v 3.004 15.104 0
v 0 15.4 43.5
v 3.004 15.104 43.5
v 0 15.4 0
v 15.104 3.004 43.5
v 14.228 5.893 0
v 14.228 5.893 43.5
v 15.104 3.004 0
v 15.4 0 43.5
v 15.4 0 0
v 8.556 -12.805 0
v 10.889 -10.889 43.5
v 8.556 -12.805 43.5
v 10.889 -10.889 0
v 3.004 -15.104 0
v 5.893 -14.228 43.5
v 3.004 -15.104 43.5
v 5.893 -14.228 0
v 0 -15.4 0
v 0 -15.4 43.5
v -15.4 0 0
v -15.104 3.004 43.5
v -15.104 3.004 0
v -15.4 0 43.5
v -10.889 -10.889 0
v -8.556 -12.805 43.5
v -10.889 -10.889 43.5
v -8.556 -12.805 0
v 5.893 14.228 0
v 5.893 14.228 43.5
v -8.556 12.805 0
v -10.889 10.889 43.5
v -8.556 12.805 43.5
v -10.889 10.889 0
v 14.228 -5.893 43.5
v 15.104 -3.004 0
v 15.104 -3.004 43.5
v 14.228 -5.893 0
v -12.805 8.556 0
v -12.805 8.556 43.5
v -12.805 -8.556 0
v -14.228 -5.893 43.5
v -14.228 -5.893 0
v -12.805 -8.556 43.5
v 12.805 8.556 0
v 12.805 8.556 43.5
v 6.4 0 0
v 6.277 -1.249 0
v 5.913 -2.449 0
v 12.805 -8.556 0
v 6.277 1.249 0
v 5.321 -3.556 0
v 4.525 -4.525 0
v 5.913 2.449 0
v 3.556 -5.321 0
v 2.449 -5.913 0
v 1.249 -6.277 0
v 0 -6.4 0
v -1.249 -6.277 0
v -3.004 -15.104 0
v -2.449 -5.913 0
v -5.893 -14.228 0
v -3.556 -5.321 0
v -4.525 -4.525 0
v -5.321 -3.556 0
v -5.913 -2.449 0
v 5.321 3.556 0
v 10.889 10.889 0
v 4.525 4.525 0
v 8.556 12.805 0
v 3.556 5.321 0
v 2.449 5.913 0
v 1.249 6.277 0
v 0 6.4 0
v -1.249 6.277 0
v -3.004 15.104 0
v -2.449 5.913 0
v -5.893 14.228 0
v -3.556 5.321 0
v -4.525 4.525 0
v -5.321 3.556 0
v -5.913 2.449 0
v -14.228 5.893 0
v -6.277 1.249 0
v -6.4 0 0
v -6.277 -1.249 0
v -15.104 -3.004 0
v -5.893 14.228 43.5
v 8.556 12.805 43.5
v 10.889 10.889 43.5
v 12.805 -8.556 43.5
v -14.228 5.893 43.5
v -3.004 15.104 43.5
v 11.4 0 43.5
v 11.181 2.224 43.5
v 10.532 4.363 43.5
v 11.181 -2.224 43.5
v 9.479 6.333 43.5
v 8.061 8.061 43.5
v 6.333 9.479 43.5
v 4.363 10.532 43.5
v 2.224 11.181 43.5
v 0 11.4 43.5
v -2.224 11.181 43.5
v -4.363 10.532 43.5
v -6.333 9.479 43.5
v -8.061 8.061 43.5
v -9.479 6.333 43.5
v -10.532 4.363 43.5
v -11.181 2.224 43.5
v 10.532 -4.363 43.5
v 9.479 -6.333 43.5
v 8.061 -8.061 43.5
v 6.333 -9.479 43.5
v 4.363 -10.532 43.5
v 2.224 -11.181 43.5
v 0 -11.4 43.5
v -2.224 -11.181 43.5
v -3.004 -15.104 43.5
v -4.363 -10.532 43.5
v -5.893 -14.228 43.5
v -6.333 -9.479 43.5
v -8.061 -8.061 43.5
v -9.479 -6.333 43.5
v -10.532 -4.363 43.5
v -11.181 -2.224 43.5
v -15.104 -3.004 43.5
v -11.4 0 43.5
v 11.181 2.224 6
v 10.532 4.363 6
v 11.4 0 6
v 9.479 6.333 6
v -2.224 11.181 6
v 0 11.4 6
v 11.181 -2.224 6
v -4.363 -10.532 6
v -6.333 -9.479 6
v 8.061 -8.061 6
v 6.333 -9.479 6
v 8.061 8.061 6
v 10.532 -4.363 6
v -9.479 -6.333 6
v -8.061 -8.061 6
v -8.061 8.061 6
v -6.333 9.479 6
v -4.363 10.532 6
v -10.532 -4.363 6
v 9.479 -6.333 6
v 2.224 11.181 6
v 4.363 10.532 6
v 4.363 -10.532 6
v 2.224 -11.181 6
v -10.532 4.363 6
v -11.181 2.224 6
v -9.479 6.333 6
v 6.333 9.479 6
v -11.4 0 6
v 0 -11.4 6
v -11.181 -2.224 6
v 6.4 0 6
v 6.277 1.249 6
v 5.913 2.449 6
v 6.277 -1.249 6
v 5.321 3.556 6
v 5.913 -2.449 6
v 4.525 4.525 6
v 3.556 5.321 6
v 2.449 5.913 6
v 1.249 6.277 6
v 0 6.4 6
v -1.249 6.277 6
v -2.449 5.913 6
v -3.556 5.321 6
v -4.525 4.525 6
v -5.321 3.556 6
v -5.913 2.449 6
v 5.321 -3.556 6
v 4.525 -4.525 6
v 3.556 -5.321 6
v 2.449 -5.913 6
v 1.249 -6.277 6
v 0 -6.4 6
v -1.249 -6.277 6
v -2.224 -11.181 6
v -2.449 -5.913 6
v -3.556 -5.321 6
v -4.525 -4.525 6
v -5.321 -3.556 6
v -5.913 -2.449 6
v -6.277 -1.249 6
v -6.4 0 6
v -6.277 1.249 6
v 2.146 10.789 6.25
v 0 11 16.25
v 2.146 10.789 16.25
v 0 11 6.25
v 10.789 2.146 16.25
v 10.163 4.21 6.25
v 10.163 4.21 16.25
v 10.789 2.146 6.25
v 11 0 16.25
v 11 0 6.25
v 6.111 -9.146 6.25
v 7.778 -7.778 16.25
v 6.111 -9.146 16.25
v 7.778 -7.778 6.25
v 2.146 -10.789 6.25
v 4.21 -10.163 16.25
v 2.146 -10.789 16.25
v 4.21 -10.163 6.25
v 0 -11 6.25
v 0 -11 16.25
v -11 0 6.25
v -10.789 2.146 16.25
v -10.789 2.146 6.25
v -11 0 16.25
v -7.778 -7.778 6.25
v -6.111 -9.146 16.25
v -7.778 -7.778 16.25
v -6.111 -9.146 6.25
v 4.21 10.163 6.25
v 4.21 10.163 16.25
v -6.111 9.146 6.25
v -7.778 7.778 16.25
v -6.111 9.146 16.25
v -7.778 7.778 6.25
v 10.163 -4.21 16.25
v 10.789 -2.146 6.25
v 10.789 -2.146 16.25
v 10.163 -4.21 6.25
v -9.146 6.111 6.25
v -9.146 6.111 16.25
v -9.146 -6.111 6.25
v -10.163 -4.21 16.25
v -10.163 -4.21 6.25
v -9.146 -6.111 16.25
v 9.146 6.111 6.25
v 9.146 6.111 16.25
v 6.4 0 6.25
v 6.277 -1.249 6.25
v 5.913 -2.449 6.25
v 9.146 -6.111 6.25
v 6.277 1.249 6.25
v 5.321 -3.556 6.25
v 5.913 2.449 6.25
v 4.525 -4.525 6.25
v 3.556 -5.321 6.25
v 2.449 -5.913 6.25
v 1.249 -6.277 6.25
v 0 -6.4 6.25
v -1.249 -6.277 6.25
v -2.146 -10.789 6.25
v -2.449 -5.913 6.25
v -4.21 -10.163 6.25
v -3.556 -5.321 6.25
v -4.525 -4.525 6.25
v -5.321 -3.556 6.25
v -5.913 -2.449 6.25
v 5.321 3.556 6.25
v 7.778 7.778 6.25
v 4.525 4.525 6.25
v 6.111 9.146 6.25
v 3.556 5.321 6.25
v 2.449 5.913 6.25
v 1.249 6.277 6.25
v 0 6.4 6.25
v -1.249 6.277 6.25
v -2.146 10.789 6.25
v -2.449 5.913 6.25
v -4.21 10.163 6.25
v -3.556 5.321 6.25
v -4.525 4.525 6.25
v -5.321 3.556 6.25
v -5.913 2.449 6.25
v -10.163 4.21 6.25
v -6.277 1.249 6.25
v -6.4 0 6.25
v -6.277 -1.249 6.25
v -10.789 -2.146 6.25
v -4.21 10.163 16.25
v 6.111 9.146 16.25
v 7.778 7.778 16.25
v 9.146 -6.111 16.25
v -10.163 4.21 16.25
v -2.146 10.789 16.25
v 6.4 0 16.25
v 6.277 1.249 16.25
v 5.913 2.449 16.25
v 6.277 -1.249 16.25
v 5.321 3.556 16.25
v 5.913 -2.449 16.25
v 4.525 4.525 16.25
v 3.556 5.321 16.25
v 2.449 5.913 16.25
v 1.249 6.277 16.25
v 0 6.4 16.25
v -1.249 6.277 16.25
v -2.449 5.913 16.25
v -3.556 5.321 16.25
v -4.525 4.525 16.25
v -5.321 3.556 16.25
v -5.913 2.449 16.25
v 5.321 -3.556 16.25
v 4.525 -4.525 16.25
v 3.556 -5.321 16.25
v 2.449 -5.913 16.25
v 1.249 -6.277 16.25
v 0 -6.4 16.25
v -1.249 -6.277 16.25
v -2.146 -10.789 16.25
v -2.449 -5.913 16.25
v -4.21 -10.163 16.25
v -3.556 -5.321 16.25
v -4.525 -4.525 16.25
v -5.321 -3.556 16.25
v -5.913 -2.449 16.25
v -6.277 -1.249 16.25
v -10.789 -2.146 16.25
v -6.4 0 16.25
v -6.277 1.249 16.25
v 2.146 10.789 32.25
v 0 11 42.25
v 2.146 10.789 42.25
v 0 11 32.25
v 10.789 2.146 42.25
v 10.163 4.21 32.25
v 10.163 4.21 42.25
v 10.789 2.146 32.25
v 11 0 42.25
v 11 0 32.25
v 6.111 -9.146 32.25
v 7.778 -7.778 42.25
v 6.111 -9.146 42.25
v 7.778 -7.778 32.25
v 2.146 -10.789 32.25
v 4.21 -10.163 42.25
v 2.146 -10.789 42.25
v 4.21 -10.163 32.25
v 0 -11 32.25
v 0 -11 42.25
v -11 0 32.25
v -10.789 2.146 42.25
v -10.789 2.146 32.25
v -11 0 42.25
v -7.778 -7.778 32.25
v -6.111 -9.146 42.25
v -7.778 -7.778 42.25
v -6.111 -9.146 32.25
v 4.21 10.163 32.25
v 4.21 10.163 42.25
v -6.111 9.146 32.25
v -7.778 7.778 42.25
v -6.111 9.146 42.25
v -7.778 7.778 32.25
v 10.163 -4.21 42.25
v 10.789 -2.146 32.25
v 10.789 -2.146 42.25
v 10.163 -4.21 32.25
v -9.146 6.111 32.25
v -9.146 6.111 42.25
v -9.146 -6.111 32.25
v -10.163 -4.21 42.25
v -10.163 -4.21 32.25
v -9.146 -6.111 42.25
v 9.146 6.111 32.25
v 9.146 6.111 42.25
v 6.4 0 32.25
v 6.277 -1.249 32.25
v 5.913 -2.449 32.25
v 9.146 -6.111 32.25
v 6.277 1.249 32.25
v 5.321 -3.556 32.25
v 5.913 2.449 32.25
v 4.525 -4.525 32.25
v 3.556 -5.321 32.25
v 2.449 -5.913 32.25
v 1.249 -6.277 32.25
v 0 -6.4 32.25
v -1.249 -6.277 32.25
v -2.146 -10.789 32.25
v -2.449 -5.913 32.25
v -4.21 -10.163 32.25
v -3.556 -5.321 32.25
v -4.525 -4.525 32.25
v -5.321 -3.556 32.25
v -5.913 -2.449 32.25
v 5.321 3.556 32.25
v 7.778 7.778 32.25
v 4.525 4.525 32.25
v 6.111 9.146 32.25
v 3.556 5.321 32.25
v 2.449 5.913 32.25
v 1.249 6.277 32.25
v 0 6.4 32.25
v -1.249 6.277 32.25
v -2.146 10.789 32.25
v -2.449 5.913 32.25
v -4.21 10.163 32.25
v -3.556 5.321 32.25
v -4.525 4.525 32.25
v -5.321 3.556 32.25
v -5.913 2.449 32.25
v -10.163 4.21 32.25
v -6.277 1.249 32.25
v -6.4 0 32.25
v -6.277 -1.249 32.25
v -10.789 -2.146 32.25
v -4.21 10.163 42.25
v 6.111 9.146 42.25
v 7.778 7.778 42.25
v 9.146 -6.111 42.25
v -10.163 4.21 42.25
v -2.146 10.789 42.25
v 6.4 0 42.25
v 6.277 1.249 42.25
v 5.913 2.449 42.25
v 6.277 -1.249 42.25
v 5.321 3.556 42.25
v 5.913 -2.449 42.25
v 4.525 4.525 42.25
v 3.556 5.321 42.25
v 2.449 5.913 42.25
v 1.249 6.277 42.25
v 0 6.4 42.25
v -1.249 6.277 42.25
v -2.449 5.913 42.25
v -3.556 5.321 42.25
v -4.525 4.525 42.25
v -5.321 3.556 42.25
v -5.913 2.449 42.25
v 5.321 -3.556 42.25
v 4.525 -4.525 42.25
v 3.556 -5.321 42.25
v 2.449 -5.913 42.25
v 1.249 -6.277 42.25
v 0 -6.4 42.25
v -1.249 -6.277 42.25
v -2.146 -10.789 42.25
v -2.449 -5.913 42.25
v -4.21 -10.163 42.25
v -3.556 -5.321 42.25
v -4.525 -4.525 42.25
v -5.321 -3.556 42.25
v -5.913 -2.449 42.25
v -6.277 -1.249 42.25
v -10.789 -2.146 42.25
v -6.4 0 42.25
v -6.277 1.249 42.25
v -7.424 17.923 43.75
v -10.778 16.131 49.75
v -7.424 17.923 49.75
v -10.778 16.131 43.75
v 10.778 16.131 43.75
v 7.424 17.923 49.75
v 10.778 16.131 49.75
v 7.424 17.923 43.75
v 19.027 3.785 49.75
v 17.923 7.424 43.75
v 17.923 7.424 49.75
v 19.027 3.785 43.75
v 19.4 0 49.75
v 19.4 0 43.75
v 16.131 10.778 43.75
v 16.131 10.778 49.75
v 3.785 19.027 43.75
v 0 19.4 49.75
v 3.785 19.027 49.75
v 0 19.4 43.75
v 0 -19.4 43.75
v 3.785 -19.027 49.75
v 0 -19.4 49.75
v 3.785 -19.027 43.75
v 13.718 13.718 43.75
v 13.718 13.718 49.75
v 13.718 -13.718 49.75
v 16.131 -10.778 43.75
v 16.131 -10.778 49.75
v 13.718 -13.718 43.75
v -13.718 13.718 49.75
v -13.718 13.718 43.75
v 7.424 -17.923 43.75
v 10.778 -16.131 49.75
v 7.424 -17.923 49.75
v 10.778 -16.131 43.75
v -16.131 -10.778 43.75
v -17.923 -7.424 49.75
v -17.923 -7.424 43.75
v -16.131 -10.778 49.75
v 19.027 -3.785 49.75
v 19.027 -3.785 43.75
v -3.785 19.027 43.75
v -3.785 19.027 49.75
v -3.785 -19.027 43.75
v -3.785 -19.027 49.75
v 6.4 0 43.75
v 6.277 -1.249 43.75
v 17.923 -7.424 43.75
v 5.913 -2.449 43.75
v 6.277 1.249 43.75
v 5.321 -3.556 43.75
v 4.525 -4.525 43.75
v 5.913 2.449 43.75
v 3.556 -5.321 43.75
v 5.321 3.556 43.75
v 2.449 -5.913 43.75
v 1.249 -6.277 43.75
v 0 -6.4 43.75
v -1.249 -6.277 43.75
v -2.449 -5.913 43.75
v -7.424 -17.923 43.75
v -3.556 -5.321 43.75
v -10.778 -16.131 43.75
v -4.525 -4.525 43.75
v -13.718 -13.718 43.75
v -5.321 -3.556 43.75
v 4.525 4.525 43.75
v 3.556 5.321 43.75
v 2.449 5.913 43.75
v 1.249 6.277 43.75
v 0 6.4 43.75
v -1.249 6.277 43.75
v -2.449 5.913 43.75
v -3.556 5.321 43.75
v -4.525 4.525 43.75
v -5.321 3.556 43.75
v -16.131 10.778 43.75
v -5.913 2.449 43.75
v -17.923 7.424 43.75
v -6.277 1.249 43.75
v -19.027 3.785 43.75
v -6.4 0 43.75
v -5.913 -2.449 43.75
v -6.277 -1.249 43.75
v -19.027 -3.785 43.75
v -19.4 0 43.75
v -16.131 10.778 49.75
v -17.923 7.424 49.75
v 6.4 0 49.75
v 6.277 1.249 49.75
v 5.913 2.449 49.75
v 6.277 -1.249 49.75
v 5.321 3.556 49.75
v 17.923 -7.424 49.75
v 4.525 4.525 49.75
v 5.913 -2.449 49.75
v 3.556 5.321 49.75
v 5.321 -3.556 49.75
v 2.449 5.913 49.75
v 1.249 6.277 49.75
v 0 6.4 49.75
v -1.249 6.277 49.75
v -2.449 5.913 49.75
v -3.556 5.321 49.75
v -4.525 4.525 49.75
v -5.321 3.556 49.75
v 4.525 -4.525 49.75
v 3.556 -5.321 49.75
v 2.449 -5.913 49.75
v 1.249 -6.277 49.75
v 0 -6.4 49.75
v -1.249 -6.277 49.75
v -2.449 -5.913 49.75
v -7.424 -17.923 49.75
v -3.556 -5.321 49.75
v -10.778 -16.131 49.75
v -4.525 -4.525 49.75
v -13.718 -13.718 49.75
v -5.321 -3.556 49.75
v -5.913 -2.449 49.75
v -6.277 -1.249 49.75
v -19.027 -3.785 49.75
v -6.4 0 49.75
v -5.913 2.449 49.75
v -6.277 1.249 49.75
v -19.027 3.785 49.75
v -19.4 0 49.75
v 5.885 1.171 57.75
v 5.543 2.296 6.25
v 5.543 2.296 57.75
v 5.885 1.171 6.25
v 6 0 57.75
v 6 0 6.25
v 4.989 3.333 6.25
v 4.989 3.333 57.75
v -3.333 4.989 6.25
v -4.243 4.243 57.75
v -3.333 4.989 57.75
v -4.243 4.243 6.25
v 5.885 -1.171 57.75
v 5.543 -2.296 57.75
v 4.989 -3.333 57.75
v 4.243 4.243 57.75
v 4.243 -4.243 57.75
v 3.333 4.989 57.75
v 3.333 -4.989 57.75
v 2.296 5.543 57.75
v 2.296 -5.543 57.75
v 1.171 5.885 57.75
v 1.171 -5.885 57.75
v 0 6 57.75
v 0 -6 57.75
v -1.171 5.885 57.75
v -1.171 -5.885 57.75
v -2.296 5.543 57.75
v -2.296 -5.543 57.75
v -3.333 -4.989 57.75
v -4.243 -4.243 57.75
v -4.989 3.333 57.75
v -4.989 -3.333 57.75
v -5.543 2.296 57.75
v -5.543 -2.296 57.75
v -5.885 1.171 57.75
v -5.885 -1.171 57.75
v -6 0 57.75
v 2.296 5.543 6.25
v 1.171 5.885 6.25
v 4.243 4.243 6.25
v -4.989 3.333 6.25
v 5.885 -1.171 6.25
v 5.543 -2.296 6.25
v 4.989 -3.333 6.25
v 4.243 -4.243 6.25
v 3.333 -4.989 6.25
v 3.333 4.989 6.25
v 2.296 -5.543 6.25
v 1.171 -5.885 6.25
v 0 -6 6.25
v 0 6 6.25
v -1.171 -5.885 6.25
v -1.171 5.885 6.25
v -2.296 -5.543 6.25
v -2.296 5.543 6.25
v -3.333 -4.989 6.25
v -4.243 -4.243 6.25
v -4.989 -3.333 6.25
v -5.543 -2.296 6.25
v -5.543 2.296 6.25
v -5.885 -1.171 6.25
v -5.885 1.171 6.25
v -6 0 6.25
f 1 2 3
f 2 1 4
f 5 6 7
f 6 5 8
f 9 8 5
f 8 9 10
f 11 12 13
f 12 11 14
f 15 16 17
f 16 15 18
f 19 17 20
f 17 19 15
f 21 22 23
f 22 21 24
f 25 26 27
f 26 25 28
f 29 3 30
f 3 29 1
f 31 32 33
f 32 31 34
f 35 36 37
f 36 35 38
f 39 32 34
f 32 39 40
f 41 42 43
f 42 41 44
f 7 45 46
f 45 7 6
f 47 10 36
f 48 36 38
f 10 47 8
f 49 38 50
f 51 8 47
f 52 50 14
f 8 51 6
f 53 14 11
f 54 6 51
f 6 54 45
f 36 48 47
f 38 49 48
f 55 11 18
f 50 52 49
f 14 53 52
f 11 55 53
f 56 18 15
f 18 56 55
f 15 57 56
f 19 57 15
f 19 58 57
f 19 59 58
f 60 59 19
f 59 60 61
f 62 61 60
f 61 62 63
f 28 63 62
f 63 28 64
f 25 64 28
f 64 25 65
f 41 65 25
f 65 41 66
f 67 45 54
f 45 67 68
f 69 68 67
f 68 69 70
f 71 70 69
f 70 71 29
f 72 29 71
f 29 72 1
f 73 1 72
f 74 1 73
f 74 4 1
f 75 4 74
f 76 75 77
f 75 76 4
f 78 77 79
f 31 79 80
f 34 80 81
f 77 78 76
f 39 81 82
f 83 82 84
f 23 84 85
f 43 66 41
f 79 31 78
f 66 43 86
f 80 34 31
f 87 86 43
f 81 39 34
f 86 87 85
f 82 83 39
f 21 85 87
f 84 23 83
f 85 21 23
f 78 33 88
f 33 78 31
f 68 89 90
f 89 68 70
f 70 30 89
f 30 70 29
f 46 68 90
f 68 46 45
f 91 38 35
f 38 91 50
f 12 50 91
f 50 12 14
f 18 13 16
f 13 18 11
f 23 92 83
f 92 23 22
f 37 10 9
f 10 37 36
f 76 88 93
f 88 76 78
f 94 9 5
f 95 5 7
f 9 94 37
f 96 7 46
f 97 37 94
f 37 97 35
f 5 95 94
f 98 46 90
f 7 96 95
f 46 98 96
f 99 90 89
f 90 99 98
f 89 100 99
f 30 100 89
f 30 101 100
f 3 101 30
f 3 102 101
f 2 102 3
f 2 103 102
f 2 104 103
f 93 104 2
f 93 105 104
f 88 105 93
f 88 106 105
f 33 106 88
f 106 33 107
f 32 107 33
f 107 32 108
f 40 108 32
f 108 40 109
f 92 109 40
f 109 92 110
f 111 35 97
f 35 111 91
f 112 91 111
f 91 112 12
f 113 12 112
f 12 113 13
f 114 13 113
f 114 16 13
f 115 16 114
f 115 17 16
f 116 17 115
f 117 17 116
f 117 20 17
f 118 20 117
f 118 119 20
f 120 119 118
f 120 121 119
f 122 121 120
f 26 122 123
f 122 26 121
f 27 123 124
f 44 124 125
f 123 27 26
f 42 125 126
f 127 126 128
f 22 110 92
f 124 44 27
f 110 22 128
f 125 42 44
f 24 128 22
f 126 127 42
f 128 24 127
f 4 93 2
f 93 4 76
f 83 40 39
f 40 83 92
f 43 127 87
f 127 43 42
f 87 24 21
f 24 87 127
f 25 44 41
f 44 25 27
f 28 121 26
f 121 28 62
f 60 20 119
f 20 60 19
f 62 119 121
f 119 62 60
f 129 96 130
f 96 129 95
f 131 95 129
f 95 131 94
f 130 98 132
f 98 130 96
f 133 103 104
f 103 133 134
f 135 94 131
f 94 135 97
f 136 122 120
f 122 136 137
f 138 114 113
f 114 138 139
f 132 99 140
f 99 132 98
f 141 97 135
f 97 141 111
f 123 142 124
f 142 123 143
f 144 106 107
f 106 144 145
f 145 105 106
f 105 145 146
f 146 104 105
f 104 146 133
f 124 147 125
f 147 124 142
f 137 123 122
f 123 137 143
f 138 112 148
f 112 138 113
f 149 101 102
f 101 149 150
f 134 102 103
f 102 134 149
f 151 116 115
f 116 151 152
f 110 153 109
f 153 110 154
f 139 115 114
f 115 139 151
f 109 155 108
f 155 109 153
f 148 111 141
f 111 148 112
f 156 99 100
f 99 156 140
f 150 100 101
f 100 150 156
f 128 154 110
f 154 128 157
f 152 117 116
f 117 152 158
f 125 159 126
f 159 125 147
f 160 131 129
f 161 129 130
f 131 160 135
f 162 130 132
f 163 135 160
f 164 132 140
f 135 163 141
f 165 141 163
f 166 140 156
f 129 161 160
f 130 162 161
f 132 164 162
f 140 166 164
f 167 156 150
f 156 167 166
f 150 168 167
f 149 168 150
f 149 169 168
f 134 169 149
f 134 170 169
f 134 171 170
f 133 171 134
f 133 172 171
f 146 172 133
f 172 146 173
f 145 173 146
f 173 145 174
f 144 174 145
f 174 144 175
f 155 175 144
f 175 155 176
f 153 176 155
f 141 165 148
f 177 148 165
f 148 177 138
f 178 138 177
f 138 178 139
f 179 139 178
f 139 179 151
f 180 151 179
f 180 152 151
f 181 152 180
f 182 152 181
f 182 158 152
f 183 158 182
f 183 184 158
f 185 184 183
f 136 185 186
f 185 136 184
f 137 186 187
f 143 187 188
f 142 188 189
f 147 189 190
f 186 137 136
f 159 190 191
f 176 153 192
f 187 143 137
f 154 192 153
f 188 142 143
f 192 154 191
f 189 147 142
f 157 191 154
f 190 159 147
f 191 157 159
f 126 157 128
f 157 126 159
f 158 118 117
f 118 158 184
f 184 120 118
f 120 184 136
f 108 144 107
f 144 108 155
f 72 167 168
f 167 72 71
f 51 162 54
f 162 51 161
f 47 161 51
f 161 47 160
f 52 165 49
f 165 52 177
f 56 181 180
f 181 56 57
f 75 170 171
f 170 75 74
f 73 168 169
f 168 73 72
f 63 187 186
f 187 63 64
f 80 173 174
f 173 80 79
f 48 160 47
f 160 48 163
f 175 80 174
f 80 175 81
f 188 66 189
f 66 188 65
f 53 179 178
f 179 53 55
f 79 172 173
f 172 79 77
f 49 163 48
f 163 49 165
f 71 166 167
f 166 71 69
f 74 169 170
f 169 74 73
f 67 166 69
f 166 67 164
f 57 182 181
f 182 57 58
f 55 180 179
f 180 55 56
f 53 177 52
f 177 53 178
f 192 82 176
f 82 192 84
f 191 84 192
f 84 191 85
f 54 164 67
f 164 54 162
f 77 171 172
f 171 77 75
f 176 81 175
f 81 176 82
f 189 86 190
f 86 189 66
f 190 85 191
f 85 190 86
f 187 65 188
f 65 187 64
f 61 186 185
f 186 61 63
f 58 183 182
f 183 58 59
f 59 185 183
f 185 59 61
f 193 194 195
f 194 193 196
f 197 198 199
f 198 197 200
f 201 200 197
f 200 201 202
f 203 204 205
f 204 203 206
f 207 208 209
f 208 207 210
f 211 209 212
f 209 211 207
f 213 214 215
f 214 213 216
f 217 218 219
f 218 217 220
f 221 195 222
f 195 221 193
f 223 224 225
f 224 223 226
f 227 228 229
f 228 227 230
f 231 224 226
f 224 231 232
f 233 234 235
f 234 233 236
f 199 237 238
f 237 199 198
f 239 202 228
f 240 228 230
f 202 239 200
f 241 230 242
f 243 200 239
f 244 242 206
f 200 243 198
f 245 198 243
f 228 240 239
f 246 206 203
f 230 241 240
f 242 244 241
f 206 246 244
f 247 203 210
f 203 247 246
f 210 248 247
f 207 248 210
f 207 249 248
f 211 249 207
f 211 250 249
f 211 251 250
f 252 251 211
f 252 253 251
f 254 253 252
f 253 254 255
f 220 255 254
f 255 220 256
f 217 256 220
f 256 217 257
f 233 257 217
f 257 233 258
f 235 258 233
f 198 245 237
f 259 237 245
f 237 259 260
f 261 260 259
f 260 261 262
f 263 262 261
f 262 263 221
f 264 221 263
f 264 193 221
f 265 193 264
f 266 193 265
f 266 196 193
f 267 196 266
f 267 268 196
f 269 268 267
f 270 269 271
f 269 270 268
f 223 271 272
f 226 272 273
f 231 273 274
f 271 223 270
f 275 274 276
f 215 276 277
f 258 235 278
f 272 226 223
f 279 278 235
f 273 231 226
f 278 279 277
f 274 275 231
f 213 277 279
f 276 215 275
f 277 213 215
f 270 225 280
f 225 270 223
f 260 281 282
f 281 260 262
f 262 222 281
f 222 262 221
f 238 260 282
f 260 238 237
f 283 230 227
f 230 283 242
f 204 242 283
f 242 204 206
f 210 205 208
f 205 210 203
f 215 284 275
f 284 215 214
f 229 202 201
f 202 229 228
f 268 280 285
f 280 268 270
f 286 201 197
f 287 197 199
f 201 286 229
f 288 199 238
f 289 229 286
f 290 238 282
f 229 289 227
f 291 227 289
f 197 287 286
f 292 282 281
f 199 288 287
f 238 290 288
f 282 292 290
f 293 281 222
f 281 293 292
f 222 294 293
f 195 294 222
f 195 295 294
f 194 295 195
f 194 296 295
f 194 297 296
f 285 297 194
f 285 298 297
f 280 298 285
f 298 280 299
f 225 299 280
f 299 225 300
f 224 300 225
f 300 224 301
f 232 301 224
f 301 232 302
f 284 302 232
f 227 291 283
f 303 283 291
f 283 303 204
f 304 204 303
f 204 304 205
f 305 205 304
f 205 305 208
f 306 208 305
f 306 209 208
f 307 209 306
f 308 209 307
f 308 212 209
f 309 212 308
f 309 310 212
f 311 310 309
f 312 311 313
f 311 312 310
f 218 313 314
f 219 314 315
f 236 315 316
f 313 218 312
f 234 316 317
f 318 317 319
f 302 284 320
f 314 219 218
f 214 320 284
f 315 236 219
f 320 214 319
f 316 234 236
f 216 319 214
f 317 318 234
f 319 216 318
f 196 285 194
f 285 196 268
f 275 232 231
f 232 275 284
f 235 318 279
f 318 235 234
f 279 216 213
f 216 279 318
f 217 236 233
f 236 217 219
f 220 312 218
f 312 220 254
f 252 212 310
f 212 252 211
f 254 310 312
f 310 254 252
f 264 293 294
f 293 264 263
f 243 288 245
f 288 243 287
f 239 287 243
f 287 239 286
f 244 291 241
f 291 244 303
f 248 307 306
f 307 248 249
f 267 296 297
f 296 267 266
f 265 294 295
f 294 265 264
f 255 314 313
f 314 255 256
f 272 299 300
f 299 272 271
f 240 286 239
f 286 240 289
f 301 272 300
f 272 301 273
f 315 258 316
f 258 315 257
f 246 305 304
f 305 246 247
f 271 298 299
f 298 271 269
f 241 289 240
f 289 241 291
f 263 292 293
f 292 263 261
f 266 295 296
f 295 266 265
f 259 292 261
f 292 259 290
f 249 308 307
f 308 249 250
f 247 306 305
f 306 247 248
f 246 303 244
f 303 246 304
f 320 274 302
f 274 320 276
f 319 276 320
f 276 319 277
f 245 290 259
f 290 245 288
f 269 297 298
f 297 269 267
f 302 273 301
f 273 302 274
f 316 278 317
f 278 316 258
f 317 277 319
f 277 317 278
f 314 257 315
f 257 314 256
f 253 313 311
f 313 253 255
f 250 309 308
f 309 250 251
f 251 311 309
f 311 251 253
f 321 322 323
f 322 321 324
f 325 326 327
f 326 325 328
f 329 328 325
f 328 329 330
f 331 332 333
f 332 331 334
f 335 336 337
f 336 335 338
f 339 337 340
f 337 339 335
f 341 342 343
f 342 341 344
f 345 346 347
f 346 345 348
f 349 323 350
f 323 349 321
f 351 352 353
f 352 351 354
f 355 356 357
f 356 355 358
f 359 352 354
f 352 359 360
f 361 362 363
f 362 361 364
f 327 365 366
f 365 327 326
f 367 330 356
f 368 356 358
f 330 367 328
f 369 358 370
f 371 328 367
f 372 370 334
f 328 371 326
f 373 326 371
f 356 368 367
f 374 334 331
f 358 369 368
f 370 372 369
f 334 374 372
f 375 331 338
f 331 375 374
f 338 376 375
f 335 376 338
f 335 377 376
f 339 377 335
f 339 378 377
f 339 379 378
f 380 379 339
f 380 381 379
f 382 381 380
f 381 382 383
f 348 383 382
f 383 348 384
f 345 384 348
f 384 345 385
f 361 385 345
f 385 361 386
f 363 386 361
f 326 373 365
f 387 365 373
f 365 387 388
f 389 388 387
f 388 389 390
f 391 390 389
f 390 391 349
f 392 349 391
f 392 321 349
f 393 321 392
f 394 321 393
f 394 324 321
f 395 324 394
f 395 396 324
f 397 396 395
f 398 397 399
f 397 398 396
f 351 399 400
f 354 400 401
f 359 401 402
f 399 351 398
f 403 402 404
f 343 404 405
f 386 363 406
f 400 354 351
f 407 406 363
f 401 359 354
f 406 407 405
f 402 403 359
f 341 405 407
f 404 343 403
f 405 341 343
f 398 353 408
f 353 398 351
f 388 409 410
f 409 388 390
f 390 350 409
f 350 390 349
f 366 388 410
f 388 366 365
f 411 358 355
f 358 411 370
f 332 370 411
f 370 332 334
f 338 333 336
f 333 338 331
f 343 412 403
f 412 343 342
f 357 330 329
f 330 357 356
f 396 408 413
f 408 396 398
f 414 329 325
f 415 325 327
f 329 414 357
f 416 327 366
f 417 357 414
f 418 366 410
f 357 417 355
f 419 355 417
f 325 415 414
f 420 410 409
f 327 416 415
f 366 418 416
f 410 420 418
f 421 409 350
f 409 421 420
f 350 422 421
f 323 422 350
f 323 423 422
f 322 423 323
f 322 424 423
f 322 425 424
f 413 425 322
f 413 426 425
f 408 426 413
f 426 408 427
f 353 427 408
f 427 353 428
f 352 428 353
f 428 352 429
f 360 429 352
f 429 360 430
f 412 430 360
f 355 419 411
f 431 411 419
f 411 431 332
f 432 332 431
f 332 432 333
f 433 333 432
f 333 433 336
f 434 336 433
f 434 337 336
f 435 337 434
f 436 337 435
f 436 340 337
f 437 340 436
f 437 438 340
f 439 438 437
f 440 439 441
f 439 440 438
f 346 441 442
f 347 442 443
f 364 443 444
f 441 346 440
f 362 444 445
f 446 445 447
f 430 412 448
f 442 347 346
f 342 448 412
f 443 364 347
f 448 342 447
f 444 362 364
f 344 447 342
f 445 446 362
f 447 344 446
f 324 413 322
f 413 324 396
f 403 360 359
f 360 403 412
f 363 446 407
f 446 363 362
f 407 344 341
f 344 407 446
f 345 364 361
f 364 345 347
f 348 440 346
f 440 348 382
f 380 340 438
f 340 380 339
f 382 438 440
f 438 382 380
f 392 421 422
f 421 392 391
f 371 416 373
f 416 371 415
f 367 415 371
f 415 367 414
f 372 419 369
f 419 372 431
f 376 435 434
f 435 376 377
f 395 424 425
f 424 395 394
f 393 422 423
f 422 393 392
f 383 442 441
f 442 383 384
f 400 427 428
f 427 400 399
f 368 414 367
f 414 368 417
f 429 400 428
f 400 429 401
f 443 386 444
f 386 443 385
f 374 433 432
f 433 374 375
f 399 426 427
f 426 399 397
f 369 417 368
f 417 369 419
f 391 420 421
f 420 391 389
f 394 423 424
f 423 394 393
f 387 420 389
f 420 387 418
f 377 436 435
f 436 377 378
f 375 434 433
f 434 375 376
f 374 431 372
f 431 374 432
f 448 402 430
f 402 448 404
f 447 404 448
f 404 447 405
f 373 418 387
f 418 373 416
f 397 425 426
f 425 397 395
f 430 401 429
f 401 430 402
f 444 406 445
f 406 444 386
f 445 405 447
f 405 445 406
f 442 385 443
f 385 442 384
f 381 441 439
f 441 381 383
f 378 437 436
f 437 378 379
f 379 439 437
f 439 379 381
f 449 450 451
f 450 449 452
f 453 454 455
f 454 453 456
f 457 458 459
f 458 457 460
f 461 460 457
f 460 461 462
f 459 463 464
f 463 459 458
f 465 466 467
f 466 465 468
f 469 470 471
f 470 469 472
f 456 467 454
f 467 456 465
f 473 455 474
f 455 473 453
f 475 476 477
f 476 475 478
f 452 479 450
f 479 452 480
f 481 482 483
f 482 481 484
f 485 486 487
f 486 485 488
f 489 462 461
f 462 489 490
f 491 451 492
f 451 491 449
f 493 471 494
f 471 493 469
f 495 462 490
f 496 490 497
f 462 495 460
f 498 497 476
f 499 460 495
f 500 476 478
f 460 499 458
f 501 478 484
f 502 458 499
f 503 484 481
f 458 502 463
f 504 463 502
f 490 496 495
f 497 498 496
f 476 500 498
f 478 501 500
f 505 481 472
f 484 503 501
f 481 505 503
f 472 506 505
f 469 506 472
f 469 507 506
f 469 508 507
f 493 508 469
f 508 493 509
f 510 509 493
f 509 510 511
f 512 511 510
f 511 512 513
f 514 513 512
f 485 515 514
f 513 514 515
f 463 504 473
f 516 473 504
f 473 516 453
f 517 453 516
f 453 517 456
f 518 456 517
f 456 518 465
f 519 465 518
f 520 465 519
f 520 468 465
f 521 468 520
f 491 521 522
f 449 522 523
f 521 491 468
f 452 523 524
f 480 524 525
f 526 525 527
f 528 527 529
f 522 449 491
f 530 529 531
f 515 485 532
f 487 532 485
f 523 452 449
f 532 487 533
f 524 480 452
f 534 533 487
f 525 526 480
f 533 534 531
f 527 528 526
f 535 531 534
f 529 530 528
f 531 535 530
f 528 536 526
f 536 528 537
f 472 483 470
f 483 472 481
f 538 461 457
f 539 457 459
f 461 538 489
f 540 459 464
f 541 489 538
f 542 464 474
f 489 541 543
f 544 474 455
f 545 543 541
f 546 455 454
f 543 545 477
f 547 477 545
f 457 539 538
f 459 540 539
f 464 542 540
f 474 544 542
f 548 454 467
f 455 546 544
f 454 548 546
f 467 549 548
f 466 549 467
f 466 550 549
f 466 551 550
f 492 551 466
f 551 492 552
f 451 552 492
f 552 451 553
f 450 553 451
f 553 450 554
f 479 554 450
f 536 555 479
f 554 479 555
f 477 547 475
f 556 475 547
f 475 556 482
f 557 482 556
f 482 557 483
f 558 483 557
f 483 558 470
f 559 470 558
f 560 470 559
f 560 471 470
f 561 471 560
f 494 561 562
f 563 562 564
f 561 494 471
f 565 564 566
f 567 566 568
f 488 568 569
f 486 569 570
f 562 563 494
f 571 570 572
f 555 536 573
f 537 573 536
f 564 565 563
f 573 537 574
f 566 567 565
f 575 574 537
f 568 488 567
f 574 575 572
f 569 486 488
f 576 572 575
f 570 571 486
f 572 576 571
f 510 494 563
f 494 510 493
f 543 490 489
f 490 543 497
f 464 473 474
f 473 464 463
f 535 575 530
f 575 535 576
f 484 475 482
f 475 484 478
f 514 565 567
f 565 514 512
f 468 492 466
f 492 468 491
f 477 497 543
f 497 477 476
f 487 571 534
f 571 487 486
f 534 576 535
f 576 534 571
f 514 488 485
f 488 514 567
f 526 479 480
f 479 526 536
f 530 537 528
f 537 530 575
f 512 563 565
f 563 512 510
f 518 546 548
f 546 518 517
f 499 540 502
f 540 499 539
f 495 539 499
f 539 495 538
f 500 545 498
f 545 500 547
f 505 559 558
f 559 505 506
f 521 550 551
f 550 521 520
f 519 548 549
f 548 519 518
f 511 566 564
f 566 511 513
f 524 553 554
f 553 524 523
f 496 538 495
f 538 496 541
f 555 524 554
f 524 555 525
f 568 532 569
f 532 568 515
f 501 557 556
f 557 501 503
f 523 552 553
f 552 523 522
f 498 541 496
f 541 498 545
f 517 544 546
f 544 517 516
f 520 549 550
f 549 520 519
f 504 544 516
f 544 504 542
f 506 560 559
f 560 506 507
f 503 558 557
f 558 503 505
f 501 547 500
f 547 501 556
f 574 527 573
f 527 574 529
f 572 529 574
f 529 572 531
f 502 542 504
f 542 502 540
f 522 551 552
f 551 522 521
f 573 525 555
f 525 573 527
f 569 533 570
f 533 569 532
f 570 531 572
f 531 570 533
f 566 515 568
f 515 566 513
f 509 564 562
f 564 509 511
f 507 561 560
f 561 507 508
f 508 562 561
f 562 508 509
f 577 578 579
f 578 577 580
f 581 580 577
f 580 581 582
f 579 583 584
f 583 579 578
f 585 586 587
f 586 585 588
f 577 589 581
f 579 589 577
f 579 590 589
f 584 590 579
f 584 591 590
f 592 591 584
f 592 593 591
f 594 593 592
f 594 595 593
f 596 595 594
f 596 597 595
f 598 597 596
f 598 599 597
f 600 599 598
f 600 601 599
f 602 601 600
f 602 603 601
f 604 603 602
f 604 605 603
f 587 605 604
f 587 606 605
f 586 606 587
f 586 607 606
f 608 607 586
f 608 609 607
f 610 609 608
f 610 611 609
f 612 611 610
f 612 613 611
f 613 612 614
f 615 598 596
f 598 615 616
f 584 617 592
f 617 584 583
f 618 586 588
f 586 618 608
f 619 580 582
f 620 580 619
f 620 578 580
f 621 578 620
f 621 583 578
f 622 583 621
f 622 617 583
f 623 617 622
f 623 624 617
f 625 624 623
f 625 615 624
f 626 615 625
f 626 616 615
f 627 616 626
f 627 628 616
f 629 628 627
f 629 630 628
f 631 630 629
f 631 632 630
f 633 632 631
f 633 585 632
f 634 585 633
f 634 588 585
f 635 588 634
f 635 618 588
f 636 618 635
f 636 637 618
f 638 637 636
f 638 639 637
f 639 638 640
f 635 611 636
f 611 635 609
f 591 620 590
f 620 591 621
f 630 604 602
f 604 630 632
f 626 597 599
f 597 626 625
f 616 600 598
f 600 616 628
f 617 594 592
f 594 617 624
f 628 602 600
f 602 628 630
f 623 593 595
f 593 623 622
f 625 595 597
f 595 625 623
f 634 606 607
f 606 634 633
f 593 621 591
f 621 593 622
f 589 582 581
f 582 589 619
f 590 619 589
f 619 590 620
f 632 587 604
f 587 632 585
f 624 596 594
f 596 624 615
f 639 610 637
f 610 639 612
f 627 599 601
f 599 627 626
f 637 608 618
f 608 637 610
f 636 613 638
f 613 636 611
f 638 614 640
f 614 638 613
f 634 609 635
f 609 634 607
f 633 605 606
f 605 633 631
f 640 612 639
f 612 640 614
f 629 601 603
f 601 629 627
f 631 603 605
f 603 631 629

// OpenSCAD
$fn = 32;

// ------------------------------------------------------------------------
// Shaft station: cup d30.8 x 43.5 mm, shaft d12
// Every part is its own module, assembly() places every instance.
// ------------------------------------------------------------------------

// --- part 1 ---
module housing_cup() {
  difference() {
    cylinder(h = 43.5, d = 30.8);
    translate([0, 0, 6]) cylinder(h = 38.5, d = 22.8);
    translate([0, 0, -1]) cylinder(h = 8, d = 12.8);
  }
}

// --- part 2 ---
module bearing_lower() {
  difference() {
      translate([0, 0, 0]) cylinder(h = 10, d = 22);
      translate([0, 0, -1]) cylinder(h = 12, d = 12.8);
    }
}

// --- part 3 ---
module bearing_upper() {
  difference() {
      translate([0, 0, 0]) cylinder(h = 10, d = 22);
      translate([0, 0, -1]) cylinder(h = 12, d = 12.8);
    }
}

// --- part 4 ---
module station_shaft() {
  translate([0, 0, -25.75]) cylinder(h = 51.5, d = 12);
}

// --- part 5 ---
module station_cover() {
  difference() {
    cylinder(h = 6, d = 38.8);
    translate([0, 0, -1]) cylinder(h = 8, d = 12.8);
  }
}

// --- assembly ---
module assembly() {
  color([0.80, 0.24, 0.20]) translate([0, 0, 0]) rotate([0, 0, 0]) housing_cup();
  color([0.20, 0.45, 0.75]) translate([0, 0, 6.25]) rotate([0, 0, 0]) bearing_lower();
  color([0.25, 0.62, 0.32]) translate([0, 0, 32.25]) rotate([0, 0, 0]) bearing_upper();
  color([0.92, 0.70, 0.18]) translate([0, 0, 32]) rotate([0, 0, 0]) station_shaft();
  color([0.58, 0.35, 0.70]) translate([0, 0, 43.75]) rotate([0, 0, 0]) station_cover();
}

assembly();
